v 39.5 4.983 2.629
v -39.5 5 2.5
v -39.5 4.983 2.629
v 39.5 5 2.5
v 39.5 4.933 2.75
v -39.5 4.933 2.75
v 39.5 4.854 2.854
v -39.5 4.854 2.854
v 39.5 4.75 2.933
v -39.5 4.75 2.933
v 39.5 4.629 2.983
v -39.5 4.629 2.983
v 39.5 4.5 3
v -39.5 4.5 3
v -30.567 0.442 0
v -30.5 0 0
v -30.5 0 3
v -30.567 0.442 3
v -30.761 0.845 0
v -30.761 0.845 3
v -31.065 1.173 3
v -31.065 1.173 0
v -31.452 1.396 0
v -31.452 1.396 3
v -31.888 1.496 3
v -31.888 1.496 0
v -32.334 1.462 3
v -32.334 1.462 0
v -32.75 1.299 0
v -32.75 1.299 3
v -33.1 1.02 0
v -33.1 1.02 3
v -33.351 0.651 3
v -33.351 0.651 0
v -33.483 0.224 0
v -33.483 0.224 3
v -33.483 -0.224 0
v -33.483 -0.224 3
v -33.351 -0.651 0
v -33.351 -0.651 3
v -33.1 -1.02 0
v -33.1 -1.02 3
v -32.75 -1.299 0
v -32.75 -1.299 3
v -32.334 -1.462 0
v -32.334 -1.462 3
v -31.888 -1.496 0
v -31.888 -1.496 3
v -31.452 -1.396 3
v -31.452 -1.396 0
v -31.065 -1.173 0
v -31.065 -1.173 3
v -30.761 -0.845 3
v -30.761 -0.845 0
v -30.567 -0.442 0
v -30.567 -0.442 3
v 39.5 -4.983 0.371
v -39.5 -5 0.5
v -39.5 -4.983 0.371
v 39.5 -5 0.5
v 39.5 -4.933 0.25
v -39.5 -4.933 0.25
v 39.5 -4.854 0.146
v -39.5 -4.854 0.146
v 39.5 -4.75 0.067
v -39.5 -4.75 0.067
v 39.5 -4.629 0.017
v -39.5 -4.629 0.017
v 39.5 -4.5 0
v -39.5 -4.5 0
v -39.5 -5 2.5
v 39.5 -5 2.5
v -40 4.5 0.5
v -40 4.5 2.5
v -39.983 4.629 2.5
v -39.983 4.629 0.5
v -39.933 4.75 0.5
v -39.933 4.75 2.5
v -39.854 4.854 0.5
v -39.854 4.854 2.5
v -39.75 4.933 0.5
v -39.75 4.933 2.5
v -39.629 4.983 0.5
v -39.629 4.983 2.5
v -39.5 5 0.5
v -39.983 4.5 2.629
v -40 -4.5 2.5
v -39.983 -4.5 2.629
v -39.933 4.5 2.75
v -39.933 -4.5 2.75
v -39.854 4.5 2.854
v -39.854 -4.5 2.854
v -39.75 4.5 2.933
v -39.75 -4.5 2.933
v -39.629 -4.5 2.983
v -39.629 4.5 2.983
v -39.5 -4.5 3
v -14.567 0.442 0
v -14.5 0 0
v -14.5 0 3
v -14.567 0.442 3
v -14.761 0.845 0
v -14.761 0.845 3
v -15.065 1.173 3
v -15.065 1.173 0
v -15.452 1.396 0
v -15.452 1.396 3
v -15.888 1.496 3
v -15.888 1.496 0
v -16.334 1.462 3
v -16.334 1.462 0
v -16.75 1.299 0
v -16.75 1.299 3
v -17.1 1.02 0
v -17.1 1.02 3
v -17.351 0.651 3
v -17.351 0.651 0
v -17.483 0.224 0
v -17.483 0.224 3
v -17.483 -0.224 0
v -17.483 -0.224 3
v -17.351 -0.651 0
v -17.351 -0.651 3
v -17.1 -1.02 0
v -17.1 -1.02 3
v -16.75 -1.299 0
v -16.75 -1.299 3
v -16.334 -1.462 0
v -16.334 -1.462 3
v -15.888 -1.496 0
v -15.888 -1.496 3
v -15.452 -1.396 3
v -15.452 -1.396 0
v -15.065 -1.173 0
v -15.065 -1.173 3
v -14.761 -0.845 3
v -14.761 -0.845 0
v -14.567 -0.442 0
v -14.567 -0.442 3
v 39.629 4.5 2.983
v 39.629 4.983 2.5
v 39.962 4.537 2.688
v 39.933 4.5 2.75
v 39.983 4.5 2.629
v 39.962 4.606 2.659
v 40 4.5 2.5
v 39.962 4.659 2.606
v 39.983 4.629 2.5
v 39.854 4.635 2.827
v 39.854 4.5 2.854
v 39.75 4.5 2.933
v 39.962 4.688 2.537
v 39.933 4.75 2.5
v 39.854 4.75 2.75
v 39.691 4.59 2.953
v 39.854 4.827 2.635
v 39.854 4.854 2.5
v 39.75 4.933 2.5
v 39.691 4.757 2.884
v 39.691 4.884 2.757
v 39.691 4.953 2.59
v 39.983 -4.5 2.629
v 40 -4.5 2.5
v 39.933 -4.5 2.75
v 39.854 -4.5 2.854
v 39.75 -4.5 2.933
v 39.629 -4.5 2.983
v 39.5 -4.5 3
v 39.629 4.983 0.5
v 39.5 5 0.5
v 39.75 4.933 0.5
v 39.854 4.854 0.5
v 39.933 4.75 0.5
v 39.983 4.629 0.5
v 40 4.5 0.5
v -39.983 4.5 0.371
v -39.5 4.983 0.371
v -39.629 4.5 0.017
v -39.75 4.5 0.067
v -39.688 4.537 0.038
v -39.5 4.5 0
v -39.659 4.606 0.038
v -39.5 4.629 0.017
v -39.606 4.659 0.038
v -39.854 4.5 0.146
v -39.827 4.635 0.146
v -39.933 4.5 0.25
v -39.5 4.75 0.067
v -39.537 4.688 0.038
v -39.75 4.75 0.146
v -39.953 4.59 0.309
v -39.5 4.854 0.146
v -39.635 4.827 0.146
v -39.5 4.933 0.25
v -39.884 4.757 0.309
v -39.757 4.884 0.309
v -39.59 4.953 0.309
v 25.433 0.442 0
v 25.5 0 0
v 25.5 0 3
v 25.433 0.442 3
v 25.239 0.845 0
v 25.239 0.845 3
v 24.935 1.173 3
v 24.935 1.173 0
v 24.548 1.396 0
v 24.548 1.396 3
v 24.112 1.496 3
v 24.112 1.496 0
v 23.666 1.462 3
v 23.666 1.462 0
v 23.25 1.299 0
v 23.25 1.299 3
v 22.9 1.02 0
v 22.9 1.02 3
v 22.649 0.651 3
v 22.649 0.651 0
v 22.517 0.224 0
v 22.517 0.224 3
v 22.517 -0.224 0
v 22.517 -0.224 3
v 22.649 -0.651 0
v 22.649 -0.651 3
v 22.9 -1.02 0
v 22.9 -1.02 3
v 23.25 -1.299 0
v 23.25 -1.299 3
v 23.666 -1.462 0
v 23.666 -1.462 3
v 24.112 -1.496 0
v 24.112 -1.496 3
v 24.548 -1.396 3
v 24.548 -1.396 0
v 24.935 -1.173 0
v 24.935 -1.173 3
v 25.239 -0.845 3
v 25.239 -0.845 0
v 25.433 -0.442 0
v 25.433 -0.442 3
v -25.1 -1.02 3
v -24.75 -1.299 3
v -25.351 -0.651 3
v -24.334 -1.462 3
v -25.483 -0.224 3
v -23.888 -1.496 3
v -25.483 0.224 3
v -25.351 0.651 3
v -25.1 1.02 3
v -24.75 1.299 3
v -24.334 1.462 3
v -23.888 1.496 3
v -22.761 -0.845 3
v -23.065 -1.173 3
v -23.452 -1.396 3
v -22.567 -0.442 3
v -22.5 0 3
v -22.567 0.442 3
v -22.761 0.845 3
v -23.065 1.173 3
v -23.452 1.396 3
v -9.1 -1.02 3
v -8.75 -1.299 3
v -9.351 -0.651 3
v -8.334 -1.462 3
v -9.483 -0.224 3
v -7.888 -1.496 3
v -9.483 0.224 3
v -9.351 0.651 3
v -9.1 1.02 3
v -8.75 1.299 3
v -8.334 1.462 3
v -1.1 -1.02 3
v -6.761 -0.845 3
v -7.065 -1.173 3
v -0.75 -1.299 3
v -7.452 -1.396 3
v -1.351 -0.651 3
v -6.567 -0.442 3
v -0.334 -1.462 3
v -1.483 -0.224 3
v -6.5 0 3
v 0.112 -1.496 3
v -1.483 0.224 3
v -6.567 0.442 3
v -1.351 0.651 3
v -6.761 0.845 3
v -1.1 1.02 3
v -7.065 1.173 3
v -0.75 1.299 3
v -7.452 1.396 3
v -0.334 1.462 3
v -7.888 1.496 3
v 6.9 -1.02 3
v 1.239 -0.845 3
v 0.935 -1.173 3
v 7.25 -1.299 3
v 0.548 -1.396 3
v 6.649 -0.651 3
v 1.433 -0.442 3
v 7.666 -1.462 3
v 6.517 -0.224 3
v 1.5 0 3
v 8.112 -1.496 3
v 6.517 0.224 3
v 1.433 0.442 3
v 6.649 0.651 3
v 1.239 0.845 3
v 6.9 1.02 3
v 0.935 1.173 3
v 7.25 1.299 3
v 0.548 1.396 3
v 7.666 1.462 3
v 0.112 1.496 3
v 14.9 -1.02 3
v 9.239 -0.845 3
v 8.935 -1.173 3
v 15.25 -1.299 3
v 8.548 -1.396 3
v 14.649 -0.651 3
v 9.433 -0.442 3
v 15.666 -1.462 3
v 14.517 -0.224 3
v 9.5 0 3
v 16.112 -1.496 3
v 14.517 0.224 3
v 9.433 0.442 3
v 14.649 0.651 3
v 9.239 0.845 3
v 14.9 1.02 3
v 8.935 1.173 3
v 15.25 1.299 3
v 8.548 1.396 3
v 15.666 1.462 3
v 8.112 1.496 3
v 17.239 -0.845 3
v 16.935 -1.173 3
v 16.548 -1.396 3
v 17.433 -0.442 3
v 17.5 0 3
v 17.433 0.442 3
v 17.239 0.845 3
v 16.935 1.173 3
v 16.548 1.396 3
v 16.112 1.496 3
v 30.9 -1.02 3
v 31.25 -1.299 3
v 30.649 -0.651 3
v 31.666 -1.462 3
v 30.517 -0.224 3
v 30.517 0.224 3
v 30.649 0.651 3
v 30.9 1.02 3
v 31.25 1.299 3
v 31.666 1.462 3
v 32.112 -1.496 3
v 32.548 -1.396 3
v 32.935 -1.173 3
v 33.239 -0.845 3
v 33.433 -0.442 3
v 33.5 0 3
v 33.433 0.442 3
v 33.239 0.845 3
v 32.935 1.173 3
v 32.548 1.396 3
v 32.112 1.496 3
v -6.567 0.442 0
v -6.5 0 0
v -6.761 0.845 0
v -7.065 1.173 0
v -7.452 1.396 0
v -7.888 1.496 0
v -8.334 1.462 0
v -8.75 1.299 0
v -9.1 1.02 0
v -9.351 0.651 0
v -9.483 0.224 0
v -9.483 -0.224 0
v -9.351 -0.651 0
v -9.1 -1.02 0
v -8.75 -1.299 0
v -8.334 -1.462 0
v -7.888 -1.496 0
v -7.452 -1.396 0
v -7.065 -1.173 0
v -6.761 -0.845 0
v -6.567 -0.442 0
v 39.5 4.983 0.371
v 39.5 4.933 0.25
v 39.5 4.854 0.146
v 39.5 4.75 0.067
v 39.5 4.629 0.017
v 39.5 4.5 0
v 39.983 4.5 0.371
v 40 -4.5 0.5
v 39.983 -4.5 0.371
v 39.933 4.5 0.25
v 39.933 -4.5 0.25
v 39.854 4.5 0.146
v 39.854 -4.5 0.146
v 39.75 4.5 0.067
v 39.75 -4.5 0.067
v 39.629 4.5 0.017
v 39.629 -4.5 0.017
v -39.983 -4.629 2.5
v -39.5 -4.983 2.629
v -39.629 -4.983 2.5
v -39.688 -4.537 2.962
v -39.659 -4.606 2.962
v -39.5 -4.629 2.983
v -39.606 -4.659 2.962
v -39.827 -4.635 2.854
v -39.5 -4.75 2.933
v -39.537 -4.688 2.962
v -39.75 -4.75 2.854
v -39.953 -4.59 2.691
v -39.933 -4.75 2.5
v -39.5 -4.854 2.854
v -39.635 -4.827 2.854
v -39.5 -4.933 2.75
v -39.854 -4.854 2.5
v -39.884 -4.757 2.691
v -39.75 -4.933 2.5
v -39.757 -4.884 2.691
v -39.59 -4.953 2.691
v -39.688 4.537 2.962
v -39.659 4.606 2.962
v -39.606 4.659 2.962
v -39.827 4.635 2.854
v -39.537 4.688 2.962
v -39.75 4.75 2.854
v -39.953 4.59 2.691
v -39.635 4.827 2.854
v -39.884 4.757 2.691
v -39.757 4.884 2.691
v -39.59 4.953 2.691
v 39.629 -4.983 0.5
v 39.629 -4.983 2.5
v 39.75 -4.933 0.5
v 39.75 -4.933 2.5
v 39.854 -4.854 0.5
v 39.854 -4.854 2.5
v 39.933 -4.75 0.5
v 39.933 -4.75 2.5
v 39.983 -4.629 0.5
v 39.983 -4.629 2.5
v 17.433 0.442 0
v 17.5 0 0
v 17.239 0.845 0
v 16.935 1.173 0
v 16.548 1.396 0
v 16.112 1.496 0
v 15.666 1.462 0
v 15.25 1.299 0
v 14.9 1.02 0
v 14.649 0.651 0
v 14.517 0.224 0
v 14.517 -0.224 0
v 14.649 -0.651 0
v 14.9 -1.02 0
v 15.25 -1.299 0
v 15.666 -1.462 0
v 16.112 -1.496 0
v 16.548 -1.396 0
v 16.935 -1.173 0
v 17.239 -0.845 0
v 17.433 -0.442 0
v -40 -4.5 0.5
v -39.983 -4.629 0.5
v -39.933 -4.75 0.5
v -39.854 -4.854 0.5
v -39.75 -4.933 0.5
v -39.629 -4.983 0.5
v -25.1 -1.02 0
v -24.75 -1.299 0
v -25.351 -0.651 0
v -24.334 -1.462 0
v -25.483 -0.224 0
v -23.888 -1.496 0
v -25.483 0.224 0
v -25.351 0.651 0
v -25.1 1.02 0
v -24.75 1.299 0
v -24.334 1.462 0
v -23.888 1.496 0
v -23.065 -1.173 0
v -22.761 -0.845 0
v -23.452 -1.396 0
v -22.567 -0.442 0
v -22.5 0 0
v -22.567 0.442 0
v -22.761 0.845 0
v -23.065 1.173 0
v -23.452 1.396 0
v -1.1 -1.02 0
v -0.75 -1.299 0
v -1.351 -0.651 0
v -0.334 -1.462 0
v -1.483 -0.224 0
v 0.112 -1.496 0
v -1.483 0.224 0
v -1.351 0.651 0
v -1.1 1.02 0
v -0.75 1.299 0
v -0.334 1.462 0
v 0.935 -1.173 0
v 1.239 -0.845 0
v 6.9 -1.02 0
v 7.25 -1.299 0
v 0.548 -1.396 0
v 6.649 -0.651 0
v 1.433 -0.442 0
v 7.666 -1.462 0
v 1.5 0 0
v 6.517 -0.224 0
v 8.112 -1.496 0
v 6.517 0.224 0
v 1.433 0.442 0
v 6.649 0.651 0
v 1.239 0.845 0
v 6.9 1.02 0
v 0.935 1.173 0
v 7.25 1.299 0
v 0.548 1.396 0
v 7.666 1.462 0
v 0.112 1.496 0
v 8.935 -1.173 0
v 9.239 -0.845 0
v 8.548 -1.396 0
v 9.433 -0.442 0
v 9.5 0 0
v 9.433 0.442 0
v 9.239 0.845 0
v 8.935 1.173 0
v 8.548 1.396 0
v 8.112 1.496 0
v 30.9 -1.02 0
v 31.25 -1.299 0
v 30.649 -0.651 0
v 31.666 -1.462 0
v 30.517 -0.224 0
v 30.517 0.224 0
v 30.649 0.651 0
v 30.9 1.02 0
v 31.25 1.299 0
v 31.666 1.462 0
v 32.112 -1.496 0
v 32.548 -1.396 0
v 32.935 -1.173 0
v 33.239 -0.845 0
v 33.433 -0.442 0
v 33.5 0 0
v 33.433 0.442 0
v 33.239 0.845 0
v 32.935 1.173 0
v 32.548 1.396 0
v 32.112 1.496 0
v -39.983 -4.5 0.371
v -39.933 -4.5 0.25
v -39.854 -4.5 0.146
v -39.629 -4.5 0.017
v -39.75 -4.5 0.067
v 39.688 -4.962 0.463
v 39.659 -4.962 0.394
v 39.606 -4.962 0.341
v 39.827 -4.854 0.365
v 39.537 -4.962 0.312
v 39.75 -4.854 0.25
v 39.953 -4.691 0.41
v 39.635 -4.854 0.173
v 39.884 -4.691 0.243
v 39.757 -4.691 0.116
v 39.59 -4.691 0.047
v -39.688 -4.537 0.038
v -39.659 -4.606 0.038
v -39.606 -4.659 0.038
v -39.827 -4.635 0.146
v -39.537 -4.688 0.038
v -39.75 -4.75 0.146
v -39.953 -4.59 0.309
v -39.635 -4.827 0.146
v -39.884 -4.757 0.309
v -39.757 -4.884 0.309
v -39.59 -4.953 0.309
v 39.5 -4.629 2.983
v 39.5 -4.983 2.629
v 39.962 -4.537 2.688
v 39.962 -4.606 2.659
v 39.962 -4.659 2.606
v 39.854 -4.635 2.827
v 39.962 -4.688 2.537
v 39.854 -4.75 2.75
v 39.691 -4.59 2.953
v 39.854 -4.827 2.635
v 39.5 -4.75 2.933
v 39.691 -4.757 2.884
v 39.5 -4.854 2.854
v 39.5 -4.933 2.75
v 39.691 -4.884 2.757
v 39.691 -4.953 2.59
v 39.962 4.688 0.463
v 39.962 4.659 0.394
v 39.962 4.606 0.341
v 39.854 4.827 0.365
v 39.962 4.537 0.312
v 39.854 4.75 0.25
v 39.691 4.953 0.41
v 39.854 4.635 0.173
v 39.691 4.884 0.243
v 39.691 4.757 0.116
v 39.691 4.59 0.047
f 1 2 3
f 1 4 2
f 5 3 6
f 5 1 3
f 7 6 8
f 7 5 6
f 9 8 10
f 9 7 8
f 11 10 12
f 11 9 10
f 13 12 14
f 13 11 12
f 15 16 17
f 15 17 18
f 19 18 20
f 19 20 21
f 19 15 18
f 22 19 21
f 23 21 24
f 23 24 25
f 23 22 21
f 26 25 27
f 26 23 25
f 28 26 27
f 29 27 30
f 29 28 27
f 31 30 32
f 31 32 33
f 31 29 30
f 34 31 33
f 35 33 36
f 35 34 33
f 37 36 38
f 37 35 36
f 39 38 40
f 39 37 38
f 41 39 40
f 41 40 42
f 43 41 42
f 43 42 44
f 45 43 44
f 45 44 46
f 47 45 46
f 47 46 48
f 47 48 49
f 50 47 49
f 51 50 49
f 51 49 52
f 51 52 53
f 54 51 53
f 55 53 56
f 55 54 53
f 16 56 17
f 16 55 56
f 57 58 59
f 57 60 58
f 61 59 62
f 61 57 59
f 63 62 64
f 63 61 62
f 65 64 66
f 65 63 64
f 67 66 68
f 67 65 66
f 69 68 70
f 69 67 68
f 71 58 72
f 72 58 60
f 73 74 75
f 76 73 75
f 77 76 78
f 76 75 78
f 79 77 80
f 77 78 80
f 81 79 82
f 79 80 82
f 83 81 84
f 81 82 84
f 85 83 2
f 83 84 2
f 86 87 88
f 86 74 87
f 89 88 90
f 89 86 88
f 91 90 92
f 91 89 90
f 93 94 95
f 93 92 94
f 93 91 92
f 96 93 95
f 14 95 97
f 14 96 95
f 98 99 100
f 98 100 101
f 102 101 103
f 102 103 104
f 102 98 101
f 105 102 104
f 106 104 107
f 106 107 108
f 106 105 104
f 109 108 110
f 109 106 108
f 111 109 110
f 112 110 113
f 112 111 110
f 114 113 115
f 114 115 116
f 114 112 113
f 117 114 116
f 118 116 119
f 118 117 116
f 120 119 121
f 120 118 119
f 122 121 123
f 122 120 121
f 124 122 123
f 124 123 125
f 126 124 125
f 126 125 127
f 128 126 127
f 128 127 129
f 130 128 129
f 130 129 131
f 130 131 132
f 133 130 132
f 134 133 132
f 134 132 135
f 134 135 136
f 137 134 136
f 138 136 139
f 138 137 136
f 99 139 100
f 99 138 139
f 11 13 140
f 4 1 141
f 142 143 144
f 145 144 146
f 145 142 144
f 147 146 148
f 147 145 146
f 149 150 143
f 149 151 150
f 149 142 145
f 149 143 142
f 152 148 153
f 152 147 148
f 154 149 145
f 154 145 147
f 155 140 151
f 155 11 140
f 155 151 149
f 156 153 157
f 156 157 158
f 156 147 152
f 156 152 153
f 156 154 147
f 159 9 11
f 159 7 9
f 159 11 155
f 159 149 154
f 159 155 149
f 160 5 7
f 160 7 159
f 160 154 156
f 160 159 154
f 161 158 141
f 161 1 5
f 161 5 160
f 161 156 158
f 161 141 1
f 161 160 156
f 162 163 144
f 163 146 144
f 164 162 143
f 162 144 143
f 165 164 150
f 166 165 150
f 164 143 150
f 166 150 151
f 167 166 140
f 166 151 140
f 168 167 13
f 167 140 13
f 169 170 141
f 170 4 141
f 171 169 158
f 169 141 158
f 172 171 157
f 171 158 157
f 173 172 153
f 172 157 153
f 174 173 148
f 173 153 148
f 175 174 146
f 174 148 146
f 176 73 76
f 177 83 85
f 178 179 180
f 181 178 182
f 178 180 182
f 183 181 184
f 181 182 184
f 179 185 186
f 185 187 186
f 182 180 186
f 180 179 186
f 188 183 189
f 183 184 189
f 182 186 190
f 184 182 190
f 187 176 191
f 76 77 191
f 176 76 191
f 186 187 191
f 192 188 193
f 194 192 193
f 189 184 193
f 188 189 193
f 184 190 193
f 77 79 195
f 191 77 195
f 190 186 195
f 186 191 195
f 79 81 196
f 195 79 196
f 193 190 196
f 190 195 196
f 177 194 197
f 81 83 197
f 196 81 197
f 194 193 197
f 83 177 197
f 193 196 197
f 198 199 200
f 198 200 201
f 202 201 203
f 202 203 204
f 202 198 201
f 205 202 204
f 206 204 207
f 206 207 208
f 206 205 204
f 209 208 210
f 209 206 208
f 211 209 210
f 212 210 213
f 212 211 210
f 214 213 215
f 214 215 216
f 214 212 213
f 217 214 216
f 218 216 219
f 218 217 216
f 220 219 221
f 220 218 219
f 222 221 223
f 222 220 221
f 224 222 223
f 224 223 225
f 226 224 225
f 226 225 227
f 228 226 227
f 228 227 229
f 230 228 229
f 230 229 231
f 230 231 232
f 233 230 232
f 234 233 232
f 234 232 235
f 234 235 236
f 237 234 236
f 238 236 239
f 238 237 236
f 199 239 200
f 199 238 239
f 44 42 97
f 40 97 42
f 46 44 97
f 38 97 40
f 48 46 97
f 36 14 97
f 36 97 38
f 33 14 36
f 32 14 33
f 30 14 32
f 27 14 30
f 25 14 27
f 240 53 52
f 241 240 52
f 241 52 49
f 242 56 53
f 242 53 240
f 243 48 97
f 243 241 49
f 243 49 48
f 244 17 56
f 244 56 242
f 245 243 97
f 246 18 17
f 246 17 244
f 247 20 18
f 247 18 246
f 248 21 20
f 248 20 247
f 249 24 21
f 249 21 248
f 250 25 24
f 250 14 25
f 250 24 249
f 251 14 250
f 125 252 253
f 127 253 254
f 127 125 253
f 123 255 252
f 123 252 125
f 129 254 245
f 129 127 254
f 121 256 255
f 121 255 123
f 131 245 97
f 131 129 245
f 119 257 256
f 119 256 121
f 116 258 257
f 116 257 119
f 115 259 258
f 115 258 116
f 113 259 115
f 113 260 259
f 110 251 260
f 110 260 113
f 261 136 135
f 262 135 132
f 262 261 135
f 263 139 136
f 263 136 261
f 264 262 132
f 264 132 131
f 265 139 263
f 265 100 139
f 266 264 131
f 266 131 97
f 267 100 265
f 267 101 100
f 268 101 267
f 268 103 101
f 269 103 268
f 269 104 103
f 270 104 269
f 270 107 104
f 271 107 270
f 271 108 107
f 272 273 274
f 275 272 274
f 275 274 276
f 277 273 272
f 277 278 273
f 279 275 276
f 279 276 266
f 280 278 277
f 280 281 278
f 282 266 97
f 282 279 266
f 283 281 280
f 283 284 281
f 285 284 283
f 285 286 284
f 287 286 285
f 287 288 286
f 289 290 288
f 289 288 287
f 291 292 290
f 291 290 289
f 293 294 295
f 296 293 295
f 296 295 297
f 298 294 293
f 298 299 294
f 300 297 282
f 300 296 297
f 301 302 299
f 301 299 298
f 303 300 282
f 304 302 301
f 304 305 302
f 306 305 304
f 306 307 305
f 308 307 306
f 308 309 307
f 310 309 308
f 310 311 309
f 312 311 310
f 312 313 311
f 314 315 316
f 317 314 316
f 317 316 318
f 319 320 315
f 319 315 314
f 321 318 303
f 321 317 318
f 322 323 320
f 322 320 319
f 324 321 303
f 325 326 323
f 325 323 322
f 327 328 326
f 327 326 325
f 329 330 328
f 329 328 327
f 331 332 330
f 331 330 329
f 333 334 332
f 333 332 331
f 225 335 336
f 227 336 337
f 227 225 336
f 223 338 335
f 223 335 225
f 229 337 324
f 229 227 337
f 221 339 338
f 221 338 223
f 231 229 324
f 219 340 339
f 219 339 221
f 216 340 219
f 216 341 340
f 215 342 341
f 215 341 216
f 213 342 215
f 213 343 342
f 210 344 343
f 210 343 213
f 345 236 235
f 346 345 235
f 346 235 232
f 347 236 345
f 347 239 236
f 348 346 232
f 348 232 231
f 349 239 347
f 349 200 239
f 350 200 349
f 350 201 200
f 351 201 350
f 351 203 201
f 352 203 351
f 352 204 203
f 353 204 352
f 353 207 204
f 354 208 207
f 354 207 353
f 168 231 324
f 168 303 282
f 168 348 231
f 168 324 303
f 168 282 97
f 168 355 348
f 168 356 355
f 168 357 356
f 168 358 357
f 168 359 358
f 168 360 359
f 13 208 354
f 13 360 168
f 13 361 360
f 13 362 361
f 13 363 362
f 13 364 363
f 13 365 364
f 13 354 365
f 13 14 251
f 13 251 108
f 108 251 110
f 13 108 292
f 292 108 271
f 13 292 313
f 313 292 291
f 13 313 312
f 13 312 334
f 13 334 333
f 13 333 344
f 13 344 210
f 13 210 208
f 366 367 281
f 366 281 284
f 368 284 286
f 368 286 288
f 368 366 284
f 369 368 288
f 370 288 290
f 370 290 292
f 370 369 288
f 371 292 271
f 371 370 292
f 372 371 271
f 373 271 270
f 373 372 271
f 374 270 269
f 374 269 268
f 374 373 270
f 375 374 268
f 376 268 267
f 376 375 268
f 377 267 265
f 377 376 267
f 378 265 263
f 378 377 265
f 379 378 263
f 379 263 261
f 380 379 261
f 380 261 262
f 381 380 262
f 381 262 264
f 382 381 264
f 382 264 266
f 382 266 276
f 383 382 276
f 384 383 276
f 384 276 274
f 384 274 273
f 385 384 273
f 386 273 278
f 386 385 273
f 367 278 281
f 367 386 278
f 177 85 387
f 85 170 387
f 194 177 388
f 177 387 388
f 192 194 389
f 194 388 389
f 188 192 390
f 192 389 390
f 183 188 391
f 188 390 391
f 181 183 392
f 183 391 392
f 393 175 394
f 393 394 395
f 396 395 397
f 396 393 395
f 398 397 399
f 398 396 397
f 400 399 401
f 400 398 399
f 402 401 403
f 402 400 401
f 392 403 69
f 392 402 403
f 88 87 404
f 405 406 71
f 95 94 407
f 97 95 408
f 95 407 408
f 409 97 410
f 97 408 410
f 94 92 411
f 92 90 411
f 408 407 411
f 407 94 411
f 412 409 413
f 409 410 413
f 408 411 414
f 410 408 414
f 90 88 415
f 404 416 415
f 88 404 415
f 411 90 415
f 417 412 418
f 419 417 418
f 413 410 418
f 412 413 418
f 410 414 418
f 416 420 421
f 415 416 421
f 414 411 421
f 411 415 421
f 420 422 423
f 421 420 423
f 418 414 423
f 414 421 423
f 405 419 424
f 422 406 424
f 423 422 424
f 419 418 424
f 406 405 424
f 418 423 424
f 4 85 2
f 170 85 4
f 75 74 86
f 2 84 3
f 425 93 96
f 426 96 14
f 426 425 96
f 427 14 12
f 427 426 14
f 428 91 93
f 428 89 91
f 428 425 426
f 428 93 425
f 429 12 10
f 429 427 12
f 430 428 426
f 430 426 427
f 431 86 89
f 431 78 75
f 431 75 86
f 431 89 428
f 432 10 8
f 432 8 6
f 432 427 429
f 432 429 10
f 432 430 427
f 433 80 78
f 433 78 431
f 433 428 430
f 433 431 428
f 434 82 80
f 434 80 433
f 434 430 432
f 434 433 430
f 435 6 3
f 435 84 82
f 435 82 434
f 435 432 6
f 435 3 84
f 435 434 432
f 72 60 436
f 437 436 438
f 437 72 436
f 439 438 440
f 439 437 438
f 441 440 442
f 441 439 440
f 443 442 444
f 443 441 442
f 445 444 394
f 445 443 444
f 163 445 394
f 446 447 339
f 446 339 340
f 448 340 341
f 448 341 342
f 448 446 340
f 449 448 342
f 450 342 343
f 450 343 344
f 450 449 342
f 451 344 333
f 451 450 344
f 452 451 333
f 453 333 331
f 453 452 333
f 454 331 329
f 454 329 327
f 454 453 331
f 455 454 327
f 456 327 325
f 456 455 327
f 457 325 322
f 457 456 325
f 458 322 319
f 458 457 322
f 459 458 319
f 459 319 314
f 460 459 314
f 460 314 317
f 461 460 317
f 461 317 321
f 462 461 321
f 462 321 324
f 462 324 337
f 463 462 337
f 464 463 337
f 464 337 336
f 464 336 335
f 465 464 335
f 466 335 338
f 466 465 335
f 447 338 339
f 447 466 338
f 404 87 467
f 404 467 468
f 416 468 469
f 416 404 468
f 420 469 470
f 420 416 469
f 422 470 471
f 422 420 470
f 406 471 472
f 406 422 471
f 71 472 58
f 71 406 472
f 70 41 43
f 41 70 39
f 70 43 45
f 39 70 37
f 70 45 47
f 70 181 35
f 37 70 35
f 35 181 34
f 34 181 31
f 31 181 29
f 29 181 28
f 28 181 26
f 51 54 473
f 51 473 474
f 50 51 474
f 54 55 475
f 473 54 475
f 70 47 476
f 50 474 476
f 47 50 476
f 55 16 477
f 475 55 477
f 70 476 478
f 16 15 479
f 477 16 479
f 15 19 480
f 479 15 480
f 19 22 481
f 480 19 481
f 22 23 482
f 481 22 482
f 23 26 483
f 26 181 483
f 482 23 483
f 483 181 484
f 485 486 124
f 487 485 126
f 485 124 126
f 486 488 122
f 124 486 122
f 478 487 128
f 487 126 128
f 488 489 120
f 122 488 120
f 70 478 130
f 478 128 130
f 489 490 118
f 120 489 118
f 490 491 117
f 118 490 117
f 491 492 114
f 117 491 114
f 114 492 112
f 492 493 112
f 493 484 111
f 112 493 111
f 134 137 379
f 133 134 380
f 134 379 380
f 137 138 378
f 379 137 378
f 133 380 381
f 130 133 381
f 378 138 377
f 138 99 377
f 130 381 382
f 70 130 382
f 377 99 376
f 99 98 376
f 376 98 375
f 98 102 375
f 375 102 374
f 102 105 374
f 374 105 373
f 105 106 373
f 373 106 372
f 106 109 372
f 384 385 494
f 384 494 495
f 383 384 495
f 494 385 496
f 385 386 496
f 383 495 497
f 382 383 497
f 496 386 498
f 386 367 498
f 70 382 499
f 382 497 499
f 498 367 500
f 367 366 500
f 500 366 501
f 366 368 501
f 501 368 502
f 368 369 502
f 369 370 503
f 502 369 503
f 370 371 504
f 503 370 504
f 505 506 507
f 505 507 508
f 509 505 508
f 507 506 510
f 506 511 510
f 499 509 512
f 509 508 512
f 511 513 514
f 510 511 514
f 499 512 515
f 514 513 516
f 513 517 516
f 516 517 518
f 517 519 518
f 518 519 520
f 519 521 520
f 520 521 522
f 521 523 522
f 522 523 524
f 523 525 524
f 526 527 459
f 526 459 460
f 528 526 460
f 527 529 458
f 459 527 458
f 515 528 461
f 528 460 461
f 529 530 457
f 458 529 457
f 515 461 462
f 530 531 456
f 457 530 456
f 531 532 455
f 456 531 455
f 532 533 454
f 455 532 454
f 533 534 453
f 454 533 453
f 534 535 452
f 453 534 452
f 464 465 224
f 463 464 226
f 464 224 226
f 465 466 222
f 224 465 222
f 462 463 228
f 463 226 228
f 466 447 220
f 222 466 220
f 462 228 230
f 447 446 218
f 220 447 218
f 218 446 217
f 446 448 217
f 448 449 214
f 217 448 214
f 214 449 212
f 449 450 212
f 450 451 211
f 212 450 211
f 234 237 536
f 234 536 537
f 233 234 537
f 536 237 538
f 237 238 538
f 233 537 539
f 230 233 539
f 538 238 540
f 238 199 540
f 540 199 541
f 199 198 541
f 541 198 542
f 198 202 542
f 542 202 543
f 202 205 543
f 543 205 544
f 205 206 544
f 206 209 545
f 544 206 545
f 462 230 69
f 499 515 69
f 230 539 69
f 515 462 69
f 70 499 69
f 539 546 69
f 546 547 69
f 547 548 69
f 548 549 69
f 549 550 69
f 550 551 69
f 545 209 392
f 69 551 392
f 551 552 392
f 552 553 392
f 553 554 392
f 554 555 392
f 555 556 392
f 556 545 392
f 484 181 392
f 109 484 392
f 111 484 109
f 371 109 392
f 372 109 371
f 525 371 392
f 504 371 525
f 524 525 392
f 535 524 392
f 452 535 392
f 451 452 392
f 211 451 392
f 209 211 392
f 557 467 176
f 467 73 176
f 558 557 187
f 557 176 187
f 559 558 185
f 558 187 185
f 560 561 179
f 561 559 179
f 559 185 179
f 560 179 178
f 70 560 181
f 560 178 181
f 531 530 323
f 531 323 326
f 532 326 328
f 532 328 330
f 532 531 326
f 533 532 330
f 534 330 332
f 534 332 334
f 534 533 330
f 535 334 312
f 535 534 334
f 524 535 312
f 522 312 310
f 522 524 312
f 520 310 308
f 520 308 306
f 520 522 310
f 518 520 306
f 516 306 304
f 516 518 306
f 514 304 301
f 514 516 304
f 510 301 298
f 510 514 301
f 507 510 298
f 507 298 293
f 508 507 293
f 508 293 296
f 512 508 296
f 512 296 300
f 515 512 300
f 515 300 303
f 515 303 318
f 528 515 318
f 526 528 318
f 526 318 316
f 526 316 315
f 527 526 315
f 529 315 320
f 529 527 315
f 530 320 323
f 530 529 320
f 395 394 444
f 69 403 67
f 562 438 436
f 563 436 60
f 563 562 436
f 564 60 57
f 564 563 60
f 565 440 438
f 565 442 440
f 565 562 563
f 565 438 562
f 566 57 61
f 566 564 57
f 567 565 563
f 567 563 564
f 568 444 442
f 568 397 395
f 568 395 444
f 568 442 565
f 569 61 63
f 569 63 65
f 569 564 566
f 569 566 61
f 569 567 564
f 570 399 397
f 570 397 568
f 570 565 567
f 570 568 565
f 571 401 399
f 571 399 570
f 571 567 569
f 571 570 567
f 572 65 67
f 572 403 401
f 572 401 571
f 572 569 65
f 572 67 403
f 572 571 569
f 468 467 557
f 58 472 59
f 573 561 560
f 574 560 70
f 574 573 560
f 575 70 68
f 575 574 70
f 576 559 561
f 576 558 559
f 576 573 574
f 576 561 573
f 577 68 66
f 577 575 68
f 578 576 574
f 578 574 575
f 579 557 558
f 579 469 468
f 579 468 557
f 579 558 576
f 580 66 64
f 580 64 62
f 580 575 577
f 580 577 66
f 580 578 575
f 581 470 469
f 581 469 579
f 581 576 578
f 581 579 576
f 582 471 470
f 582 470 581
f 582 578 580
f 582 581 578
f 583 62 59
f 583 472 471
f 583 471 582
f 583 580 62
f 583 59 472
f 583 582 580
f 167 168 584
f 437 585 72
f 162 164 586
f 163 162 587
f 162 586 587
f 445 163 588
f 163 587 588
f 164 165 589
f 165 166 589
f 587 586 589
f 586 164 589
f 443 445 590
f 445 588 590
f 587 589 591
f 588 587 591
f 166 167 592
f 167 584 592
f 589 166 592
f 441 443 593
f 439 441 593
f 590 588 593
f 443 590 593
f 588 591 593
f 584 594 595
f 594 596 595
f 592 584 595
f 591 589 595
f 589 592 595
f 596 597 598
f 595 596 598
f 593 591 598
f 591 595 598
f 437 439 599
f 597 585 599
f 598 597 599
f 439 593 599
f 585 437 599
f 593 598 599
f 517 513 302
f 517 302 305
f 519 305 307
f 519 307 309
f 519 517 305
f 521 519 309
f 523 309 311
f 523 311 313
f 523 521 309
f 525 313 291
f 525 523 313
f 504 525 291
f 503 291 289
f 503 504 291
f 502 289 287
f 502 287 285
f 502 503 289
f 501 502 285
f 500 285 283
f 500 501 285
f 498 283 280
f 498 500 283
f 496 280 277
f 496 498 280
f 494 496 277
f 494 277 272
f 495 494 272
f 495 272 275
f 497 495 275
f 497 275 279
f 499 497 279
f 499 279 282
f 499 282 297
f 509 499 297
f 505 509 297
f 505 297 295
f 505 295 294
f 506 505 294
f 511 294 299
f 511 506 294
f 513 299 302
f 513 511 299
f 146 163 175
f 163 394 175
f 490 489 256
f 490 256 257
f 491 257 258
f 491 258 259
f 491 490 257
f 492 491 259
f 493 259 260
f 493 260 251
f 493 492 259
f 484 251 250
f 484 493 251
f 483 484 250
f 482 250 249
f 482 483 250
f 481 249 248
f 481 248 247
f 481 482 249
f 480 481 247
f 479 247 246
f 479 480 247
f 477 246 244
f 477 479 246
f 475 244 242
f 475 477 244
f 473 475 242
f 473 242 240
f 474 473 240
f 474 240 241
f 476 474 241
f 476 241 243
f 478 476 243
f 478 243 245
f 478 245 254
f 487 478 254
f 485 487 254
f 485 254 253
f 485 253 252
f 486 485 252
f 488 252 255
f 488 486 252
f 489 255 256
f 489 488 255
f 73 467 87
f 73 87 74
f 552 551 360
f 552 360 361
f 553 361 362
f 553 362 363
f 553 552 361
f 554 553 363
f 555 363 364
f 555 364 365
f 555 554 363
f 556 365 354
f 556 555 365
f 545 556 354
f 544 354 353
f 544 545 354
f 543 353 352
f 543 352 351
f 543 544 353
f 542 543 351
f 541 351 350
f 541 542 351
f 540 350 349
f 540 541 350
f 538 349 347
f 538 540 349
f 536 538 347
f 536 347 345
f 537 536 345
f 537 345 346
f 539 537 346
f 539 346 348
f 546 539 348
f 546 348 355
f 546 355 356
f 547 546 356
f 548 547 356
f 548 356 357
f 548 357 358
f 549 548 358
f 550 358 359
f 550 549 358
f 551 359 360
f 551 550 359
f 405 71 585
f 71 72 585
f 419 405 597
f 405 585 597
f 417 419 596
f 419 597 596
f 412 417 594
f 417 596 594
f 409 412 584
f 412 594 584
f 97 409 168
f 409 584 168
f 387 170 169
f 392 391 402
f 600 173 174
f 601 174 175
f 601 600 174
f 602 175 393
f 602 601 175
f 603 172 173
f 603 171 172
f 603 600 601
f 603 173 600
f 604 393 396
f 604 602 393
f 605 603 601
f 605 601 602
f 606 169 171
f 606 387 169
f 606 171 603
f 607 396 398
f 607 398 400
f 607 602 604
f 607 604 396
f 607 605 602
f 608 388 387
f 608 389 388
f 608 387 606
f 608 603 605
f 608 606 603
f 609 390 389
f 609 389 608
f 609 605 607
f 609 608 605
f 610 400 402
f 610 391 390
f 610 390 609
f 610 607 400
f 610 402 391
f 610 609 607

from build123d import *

# Parameters (mm, degrees)
SKETCH_W  = 80
SKETCH_H  = 10
SKETCH_R  = 1.5
PAD_DEPTH = 3
FILLET_R  = 0.5


with BuildPart() as part:
    # Sketch → Pad (new body)
    with BuildSketch(Plane.XY):
        Rectangle(SKETCH_W, SKETCH_H)
        with Locations((-32, 0)):
            Circle(SKETCH_R, mode=Mode.SUBTRACT)
        with Locations((-24, 0)):
            Circle(SKETCH_R, mode=Mode.SUBTRACT)
        with Locations((-8, 0)):
            Circle(SKETCH_R, mode=Mode.SUBTRACT)
        Circle(SKETCH_R, mode=Mode.SUBTRACT)
        with Locations((8, 0)):
            Circle(SKETCH_R, mode=Mode.SUBTRACT)
        with Locations((16, 0)):
            Circle(SKETCH_R, mode=Mode.SUBTRACT)
        with Locations((24, 0)):
            Circle(SKETCH_R, mode=Mode.SUBTRACT)
        with Locations((32, 0)):
            Circle(SKETCH_R, mode=Mode.SUBTRACT)
        with Locations((-16, 0)):
            Circle(SKETCH_R, mode=Mode.SUBTRACT)
    extrude(amount=PAD_DEPTH)

    # Fillet
    fillet_edges = [part.edges().sort_by_distance(p)[0] for p in [
        (-40, 5, 1.5),
        (-40, -5, 1.5),
        (-40, 0, 3),
        (-40, 0, 0),
        (0, 5, 3),
        (0, 5, 0),
        (0, -5, 3),
        (40, 0, 3),
        (40, 5, 1.5),
        (40, 0, 0),
        (40, -5, 1.5),
        (0, -5, 0),
    ]]
    fillet(fillet_edges, radius=FILLET_R)


solid = part.part
